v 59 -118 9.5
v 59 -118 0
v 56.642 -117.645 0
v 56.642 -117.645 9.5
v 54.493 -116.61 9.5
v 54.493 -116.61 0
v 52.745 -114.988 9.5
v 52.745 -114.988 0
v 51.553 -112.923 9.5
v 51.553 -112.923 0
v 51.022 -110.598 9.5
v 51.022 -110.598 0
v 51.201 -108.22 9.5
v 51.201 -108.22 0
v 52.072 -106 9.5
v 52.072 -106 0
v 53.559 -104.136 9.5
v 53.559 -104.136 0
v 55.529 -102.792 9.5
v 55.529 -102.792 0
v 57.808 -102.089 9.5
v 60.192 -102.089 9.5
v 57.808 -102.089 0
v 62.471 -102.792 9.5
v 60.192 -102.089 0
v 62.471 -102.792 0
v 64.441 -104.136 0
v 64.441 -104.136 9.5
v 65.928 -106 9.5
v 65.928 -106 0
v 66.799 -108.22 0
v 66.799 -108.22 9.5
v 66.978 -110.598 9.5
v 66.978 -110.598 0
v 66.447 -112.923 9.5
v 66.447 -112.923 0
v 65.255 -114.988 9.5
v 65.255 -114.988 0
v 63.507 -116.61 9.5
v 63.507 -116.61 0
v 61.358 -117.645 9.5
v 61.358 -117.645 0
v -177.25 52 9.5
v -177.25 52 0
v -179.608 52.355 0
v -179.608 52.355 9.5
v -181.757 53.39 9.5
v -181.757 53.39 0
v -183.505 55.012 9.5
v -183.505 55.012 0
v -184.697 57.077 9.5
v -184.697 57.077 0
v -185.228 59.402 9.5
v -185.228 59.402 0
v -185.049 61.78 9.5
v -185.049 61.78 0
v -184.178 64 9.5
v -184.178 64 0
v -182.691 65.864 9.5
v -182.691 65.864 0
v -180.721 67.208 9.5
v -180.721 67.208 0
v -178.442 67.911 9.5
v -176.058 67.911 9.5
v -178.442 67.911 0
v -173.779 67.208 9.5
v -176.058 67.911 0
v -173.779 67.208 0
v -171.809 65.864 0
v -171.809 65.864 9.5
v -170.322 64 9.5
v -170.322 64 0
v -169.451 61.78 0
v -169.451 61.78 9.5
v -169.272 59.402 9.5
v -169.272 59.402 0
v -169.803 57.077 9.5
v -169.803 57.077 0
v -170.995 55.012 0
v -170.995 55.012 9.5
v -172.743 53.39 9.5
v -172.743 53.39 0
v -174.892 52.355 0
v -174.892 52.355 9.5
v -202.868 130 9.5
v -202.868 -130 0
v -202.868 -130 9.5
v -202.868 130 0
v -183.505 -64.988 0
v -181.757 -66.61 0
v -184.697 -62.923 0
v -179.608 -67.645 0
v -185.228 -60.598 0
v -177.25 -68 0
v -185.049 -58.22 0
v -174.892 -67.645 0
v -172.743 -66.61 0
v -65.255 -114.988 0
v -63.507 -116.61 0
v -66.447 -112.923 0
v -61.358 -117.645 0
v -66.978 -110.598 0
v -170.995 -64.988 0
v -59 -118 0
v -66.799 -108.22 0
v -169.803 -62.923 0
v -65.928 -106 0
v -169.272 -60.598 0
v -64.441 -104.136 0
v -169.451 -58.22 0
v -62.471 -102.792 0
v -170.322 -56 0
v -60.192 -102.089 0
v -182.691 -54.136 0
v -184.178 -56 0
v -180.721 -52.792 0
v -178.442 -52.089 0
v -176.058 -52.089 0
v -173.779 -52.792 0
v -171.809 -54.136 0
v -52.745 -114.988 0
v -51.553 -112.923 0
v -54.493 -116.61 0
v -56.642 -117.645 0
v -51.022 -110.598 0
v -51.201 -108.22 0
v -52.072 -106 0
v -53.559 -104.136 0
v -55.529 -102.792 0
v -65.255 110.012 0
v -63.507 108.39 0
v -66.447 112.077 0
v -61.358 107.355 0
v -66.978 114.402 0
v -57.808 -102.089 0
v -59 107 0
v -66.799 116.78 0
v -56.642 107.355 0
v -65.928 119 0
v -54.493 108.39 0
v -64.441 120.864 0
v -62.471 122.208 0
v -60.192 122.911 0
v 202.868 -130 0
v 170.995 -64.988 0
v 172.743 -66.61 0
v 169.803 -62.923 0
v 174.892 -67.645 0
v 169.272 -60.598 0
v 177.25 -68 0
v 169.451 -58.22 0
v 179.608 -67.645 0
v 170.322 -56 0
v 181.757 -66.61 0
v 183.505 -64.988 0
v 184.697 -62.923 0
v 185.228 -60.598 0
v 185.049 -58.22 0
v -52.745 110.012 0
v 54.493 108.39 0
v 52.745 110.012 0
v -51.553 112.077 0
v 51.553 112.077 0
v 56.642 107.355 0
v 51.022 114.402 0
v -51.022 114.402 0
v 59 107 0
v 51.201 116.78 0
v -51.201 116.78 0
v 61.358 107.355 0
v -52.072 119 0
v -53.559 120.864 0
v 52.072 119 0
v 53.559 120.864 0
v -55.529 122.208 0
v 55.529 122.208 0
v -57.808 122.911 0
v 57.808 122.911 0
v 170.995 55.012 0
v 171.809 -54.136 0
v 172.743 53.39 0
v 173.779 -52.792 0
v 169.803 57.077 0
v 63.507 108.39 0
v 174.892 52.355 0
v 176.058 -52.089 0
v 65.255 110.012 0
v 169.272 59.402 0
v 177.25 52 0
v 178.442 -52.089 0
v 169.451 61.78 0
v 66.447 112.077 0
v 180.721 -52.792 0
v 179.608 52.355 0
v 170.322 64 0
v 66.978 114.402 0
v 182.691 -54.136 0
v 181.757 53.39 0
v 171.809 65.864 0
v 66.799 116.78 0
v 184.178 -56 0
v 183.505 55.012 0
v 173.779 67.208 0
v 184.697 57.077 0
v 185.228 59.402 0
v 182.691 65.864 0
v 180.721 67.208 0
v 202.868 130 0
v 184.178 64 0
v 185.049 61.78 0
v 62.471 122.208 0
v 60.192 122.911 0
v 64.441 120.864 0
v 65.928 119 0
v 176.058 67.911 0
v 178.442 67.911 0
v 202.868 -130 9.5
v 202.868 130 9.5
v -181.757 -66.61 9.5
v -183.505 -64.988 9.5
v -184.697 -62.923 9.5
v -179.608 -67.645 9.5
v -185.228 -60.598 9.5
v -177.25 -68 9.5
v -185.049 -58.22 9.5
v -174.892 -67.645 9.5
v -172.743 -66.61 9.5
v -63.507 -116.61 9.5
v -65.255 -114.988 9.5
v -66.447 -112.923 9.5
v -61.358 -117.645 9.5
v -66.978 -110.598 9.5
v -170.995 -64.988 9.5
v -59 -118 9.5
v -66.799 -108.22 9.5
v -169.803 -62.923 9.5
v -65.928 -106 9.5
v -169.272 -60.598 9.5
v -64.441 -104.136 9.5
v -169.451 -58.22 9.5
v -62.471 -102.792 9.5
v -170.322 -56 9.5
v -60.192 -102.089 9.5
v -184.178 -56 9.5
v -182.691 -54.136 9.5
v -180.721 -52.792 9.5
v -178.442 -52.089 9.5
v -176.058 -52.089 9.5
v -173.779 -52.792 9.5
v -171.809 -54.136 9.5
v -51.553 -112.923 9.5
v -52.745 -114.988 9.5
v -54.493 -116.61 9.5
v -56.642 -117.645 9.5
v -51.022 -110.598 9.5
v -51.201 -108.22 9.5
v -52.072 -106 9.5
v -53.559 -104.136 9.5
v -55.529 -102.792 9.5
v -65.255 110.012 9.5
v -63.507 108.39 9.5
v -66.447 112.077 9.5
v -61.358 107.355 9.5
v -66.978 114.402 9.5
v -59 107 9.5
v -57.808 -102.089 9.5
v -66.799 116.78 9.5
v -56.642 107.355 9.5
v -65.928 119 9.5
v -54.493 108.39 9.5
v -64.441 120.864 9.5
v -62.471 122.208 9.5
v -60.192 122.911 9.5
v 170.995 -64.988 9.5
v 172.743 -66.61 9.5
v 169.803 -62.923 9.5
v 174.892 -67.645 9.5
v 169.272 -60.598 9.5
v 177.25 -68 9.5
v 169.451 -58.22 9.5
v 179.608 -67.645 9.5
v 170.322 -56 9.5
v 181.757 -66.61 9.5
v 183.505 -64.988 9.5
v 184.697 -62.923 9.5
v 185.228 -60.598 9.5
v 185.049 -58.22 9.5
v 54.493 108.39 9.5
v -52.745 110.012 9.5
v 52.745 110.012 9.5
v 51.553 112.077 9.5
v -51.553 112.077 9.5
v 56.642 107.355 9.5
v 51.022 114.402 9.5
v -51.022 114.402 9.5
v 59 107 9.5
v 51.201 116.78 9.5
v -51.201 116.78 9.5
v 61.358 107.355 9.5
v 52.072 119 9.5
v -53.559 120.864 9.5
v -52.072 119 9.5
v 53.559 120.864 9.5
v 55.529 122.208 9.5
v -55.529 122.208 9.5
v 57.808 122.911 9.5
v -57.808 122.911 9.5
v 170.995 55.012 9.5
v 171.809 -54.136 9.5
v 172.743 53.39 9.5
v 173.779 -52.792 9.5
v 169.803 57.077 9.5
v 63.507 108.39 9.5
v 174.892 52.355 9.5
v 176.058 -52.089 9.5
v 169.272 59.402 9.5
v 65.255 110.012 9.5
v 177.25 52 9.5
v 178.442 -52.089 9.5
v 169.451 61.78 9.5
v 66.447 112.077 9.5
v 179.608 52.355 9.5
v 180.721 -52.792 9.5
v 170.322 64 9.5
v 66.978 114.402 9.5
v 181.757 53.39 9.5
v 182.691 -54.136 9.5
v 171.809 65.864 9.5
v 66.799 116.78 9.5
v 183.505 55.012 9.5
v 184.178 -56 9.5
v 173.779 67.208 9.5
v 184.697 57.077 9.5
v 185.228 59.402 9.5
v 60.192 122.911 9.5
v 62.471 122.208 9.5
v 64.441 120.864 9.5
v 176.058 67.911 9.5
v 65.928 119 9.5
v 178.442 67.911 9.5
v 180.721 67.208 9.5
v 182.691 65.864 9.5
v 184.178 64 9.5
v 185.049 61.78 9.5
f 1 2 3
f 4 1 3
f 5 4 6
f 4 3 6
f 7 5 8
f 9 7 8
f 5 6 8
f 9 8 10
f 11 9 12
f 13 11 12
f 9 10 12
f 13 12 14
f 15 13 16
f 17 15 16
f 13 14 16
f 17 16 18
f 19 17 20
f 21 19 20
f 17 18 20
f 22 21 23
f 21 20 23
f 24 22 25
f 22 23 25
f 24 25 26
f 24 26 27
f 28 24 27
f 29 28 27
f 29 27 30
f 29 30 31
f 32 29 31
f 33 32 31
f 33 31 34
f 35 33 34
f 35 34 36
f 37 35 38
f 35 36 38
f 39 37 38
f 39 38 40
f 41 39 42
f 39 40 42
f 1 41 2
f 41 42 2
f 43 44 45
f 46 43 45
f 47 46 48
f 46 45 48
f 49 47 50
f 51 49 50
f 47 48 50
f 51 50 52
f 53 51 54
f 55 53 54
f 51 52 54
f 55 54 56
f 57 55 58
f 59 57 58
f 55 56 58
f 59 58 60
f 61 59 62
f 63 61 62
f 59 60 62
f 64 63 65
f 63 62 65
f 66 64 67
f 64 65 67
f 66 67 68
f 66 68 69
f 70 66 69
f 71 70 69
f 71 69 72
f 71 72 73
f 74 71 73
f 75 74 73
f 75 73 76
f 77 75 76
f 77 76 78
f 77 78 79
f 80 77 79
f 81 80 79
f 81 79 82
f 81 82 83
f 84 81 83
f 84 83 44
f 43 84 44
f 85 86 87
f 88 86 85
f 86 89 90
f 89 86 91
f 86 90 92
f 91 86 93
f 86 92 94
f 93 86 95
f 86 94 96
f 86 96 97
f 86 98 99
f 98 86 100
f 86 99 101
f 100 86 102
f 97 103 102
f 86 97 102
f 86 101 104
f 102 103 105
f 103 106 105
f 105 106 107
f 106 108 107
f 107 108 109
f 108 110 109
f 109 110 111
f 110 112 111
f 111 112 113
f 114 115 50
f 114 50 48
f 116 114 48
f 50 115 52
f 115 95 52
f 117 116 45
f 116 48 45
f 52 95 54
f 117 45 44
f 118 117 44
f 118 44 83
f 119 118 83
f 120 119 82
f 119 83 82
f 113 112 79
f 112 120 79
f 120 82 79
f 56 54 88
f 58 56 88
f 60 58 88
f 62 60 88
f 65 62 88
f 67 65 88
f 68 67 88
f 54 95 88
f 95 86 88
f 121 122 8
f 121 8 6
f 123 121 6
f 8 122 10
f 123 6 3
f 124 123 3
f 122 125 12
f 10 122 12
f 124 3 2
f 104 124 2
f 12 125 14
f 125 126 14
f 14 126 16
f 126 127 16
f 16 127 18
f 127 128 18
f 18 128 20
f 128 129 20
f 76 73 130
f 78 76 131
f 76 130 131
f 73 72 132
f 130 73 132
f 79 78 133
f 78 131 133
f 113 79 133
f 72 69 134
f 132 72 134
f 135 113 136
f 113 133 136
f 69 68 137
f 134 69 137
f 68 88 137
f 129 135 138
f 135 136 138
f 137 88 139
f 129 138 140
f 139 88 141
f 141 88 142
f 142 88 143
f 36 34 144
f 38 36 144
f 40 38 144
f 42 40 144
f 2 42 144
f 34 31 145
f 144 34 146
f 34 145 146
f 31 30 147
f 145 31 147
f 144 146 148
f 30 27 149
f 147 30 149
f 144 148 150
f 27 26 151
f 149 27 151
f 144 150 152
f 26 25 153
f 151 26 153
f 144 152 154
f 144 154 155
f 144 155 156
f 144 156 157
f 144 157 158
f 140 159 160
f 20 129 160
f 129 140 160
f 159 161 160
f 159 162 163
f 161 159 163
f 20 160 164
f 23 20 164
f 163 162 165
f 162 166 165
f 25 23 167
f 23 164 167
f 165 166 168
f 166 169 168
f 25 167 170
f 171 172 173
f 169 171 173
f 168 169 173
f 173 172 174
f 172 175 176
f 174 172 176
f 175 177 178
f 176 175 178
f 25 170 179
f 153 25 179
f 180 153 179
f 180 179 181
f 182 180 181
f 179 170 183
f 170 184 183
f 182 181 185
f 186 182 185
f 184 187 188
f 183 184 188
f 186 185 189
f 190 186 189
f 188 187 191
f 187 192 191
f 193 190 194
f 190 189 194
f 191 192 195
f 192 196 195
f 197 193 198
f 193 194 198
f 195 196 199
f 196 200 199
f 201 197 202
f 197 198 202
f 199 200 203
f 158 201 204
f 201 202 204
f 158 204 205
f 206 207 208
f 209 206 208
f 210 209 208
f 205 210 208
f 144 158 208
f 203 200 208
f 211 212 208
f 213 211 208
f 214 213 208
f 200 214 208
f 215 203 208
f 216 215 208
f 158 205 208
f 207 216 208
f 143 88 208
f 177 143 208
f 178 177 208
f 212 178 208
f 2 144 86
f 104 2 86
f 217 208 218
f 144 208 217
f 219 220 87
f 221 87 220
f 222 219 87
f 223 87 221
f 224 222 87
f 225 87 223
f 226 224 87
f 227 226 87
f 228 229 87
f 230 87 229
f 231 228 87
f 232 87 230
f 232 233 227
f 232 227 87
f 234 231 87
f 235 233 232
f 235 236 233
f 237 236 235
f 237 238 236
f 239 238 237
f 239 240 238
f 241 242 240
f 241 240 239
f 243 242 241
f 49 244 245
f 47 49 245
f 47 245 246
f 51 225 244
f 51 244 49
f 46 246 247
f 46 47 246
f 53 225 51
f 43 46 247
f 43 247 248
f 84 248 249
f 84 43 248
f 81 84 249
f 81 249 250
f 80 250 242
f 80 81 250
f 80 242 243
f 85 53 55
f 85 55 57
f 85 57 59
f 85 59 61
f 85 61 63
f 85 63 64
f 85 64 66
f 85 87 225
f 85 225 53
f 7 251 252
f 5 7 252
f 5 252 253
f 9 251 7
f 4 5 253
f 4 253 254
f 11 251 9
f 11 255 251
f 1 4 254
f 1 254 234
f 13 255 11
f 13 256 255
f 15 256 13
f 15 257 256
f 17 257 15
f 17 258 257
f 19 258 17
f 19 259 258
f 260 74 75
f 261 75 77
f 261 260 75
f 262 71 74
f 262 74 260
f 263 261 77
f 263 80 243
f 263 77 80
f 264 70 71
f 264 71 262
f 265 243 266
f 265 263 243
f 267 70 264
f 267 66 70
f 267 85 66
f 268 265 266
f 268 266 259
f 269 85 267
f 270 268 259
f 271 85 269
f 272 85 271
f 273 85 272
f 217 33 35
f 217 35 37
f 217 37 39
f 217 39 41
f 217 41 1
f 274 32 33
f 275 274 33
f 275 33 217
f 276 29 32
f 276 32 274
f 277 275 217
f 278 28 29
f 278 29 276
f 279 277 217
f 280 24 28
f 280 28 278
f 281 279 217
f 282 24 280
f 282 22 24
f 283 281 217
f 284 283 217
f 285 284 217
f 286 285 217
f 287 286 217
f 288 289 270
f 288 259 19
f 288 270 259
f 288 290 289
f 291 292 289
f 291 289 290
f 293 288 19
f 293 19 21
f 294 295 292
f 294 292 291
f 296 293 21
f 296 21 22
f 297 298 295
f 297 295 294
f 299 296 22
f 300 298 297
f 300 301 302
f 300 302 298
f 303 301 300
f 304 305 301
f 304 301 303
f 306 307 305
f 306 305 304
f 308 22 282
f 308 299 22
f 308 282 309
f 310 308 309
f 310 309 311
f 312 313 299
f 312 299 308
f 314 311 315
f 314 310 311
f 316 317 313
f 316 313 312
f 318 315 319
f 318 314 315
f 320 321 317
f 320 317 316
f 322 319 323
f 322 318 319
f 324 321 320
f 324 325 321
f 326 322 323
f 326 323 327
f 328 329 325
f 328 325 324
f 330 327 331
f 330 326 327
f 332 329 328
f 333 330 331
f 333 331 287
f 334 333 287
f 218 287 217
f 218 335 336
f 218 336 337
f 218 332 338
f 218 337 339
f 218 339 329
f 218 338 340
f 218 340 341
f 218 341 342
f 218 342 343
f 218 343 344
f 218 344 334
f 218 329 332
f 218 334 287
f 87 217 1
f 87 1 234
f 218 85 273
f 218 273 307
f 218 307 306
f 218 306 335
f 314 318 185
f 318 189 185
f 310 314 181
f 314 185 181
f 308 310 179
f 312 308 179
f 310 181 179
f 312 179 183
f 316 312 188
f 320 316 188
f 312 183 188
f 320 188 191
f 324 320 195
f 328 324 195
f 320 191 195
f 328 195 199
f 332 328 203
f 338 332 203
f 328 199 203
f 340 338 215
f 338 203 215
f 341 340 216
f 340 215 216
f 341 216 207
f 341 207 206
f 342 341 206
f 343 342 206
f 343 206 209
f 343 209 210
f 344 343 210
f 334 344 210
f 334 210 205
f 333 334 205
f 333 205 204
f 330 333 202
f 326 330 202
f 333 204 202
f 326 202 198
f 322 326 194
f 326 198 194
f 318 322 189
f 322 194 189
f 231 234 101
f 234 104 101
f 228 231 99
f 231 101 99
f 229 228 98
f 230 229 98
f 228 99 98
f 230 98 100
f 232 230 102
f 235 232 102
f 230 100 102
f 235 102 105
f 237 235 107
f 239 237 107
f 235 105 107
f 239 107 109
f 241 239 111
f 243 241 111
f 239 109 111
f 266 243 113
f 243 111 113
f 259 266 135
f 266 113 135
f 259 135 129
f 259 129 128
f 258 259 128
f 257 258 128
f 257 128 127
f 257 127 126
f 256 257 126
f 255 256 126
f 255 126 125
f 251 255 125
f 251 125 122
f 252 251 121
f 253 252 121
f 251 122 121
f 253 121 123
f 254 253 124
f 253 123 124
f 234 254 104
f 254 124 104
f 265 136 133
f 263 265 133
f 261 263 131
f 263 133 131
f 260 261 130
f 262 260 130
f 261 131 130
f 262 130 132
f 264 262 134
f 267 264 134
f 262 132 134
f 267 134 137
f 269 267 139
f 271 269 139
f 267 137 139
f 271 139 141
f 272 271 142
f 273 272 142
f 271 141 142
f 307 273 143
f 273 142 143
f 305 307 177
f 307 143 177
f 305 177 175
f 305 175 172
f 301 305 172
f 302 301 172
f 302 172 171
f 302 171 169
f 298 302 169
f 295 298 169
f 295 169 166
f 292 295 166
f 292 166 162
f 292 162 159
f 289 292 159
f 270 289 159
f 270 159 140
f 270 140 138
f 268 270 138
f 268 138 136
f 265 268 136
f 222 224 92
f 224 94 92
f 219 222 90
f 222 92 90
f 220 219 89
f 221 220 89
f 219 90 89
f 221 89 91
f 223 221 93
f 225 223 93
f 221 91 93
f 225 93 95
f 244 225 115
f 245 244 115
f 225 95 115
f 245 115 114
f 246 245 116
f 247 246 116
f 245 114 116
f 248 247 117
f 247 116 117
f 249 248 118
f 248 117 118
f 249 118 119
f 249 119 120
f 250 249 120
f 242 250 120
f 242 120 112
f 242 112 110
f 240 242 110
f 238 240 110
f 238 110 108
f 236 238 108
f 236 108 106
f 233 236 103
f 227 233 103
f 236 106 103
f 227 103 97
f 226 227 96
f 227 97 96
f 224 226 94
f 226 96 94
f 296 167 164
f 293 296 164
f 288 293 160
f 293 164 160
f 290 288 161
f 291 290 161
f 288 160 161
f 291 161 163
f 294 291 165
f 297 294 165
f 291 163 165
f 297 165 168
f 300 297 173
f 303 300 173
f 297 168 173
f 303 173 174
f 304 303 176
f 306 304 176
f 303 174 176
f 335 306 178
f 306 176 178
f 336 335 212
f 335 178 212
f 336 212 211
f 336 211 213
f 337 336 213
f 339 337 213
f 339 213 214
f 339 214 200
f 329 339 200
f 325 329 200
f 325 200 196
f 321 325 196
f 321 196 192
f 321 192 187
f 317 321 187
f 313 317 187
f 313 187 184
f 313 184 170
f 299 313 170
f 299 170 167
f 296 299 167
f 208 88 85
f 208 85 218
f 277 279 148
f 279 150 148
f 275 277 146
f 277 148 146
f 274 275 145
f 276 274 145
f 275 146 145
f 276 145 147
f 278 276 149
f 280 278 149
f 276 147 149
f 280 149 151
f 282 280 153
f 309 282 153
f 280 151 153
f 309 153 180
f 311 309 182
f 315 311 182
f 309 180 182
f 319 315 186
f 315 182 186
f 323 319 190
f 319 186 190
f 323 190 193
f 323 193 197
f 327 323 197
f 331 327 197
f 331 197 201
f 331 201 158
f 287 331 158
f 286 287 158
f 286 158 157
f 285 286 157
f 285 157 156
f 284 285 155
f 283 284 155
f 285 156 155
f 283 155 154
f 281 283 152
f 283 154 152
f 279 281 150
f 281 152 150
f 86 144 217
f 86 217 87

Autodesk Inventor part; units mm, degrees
ref_plane "YZ Plane" through (0, 0, 0) normal (1, 0, 0) x (0, 1, 0)
ref_plane "XZ Plane" through (0, 0, 0) normal (0, 1, 0) x (-1, 0, 0)
ref_plane "XY Plane" through (0, 0, 0) normal (0, 0, 1) x (1, 0, 0)
sketch "Sketch1" plane through (0, 0, 0) normal (0, 0, 1) x (1, 0, 0)
  line L0 (-202.8675, 130) -> (202.8675, 130)
  line L1 (202.8675, 130) -> (202.8675, -130)
  line L2 (202.8675, -130) -> (-202.8675, -130)
  line L3 (-202.8675, -130) -> (-202.8675, 130)
  point P0 (0, 0)
  dimension "d0" = 405.735
  dimension "d1" = 260
  dimension "d2" = 130
  dimension "d3" = 202.8675
extrude "Plate1" add sketch "Sketch1" along normal blind 9.5
sketch "Sketch2" plane through (0, 0, 9.5) normal (0, 0, 1) x (1, 0, 0)
  line L0 (-59, 115) -> (59, 115)
  line L1 (59, 115) -> (59, -110)
  line L2 (59, -110) -> (-59, -110)
  line L3 (-59, -110) -> (-59, 115)
  line L4 (-202.8675, -130) -> (-202.8675, 130) projected
  line L5 (202.8675, -130) -> (-202.8675, -130) projected
  line L6 (-177.25, 60) -> (177.25, 60)
  line L7 (177.25, 60) -> (177.25, -60)
  line L8 (177.25, -60) -> (-177.25, -60)
  line L9 (-177.25, -60) -> (-177.25, 60)
  line L10 (202.8675, 130) -> (202.8675, -130) projected
  point P0 (0, 0)
  dimension "d5" = 118
  dimension "d7" = 225
  dimension "d8" = 20
  dimension "d17" = 120
  dimension "d18" = 60
  dimension "d21" = 118.25
  dimension "d22" = 118.25
  dimension "d23" = 59
hole "Hole1" at (-59, -110, 9.5) at (-59, 115, 9.5) at (59, 115, 9.5) at (59, -110, 9.5) at (-177.25, 60, 9.5) at (-177.25, -60, 9.5) at (177.25, 60, 9.5) at (177.25, -60, 9.5) direction (0, 0, -1) diameter 16 depth 9.5
equation "\"d18\" = 0.5 * d17"
equation "\"d23\" = 0.5 * d5"
equation "\"d14\" = Thickness"
equation "\"d4\" = Thickness"
equation "\"d2\" = 0.5 * d1"
equation "\"d3\" = 0.5 * d0"
equation "\"BendRadius\" = Thickness"
equation "\"BendReliefWidth\" = Thickness"
equation "\"BendReliefDepth\" = 0.5 * Thickness"
equation "\"CornerReliefSize\" = 4 * Thickness"
equation "\"MinimumRemnant\" = 2 * Thickness"
equation "\"TransitionRadius\" = BendRadius"
equation "\"JacobiRadiusSize\" = BendRadius"
equation "\"GapSize\" = Thickness"
equation "\"Thickness\" = 9.5"
properties part number "PlacaReductor"
